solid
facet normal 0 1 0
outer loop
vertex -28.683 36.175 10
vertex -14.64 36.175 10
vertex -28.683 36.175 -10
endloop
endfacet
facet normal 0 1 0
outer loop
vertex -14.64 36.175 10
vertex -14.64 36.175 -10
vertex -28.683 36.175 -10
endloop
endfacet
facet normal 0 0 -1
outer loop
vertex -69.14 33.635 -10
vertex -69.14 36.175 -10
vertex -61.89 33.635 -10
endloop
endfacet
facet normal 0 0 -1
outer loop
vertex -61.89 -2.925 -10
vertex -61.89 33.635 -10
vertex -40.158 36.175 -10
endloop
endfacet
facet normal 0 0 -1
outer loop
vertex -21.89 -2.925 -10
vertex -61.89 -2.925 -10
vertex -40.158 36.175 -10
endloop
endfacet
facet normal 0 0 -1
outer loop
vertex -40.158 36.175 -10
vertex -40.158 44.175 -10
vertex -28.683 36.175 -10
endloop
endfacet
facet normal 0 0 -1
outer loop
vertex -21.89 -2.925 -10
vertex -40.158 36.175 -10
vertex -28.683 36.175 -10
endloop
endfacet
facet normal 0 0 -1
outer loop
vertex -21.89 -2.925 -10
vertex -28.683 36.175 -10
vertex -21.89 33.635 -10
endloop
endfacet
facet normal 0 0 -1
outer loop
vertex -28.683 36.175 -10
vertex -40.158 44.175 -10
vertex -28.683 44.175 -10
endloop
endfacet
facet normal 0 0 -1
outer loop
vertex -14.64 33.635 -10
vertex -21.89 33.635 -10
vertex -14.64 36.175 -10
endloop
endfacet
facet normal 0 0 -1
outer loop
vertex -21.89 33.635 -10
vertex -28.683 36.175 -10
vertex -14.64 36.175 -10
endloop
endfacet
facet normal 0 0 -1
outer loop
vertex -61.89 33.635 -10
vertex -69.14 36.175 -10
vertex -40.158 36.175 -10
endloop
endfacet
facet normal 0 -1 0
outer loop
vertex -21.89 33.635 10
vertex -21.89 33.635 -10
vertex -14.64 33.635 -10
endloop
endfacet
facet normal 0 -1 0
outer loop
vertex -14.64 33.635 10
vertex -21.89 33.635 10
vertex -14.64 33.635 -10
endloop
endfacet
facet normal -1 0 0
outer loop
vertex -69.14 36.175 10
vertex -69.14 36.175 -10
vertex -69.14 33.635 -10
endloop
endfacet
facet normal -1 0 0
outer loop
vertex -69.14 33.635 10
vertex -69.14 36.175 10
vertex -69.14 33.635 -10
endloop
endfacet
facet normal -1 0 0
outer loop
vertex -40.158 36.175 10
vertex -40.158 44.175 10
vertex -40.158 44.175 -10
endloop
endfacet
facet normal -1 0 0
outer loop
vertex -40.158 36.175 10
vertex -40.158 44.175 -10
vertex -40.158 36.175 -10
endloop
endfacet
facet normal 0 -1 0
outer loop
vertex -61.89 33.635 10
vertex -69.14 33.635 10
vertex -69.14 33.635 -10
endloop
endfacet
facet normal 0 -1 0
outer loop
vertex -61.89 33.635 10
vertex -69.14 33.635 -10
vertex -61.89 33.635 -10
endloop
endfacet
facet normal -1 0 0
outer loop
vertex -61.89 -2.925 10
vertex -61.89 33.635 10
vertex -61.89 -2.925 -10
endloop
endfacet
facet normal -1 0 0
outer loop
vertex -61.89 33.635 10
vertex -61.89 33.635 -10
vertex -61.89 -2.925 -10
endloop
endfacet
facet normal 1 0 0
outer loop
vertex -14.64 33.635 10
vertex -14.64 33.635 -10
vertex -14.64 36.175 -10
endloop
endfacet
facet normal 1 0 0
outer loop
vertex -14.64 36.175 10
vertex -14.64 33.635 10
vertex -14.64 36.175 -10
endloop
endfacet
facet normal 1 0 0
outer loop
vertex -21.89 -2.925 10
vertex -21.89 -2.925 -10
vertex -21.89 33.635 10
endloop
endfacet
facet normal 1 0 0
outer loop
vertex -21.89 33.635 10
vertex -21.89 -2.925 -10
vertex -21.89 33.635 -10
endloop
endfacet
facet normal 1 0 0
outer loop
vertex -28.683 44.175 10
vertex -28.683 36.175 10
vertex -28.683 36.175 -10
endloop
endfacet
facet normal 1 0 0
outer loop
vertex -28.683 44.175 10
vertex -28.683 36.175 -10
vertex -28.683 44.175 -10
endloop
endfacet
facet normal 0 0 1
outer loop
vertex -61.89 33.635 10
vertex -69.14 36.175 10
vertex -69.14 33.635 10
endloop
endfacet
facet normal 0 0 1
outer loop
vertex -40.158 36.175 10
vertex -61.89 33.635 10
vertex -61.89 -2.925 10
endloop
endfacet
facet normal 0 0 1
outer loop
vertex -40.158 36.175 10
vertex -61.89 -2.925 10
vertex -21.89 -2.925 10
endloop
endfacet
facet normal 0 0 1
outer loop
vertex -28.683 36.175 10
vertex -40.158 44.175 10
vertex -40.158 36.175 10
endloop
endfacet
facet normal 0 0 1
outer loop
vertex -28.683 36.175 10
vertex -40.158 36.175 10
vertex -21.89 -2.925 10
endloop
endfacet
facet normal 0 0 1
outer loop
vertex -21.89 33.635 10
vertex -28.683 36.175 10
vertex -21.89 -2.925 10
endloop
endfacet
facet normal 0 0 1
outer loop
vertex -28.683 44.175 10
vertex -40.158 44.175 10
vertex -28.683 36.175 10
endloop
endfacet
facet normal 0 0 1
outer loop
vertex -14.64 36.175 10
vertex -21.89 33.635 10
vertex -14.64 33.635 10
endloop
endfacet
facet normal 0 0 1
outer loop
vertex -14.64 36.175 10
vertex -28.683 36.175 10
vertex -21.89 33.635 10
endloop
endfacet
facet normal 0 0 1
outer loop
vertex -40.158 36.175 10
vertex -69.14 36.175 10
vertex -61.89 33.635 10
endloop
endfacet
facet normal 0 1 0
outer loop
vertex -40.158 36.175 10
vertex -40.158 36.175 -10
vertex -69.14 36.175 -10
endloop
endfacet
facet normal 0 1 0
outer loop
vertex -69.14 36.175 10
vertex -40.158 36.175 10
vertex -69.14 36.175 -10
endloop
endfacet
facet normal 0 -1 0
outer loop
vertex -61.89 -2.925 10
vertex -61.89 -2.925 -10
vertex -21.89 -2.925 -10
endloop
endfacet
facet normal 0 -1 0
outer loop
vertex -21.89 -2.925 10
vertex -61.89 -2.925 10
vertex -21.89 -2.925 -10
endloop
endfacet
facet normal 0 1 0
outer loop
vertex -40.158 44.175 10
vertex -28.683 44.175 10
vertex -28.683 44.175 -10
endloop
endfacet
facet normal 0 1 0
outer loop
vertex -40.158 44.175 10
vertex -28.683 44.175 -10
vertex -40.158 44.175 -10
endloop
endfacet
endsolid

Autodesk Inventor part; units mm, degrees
ref_plane "YZ Plane" through (0, 0, 0) normal (1, 0, 0) x (0, 1, 0)
ref_plane "XZ Plane" through (0, 0, 0) normal (0, 1, 0) x (-1, 0, 0)
ref_plane "XY Plane" through (0, 0, 0) normal (0, 0, 1) x (1, 0, 0)
sketch "Sketch1" plane through (0, 0, 0) normal (0, 0, 1) x (1, 0, 0)
  line L0 (-69.1405, 36.1754) -> (-69.1405, 33.6354)
  line L1 (-69.1405, 33.6354) -> (-61.8905, 33.6354)
  line L2 (-61.8905, 33.6354) -> (-61.8905, -2.9246)
  line L3 (-61.8905, -2.9246) -> (-21.8905, -2.9246)
  line L4 (-21.8905, -2.9246) -> (-21.8905, 33.6354)
  line L5 (-21.8905, 33.6354) -> (-14.6405, 33.6354)
  line L6 (-14.6405, 33.6354) -> (-14.6405, 36.1754)
  line L7 (-14.6405, 36.1754) -> (-21.8905, 36.1754)
  line L8 (-21.8905, 36.1754) -> (-21.8905, 36.1754)
  line L9 (-21.8905, 36.1754) -> (-28.6829, 36.1754)
  line L10 (-28.6829, 36.1754) -> (-28.6829, 44.1754)
  line L11 (-28.6829, 44.1754) -> (-40.1582, 44.1754)
  line L12 (-40.1582, 44.1754) -> (-40.1582, 36.1754)
  line L13 (-40.1582, 36.1754) -> (-61.8905, 36.1754)
  line L14 (-61.8905, 36.1754) -> (-61.8905, 36.1754)
  line L15 (-61.8905, 36.1754) -> (-69.1405, 36.1754)
  dimension "d7" = 47.1
  dimension "d8" = 40
  dimension "d9" = 39.1
  dimension "d10" = 54.5
  dimension "d11" = 39.1
  dimension "d12" = 2.54
extrude "Extrusion1" add sketch "Sketch1" along normal mid plane 20
properties part number "FUTABA-RS404PD Blank"
